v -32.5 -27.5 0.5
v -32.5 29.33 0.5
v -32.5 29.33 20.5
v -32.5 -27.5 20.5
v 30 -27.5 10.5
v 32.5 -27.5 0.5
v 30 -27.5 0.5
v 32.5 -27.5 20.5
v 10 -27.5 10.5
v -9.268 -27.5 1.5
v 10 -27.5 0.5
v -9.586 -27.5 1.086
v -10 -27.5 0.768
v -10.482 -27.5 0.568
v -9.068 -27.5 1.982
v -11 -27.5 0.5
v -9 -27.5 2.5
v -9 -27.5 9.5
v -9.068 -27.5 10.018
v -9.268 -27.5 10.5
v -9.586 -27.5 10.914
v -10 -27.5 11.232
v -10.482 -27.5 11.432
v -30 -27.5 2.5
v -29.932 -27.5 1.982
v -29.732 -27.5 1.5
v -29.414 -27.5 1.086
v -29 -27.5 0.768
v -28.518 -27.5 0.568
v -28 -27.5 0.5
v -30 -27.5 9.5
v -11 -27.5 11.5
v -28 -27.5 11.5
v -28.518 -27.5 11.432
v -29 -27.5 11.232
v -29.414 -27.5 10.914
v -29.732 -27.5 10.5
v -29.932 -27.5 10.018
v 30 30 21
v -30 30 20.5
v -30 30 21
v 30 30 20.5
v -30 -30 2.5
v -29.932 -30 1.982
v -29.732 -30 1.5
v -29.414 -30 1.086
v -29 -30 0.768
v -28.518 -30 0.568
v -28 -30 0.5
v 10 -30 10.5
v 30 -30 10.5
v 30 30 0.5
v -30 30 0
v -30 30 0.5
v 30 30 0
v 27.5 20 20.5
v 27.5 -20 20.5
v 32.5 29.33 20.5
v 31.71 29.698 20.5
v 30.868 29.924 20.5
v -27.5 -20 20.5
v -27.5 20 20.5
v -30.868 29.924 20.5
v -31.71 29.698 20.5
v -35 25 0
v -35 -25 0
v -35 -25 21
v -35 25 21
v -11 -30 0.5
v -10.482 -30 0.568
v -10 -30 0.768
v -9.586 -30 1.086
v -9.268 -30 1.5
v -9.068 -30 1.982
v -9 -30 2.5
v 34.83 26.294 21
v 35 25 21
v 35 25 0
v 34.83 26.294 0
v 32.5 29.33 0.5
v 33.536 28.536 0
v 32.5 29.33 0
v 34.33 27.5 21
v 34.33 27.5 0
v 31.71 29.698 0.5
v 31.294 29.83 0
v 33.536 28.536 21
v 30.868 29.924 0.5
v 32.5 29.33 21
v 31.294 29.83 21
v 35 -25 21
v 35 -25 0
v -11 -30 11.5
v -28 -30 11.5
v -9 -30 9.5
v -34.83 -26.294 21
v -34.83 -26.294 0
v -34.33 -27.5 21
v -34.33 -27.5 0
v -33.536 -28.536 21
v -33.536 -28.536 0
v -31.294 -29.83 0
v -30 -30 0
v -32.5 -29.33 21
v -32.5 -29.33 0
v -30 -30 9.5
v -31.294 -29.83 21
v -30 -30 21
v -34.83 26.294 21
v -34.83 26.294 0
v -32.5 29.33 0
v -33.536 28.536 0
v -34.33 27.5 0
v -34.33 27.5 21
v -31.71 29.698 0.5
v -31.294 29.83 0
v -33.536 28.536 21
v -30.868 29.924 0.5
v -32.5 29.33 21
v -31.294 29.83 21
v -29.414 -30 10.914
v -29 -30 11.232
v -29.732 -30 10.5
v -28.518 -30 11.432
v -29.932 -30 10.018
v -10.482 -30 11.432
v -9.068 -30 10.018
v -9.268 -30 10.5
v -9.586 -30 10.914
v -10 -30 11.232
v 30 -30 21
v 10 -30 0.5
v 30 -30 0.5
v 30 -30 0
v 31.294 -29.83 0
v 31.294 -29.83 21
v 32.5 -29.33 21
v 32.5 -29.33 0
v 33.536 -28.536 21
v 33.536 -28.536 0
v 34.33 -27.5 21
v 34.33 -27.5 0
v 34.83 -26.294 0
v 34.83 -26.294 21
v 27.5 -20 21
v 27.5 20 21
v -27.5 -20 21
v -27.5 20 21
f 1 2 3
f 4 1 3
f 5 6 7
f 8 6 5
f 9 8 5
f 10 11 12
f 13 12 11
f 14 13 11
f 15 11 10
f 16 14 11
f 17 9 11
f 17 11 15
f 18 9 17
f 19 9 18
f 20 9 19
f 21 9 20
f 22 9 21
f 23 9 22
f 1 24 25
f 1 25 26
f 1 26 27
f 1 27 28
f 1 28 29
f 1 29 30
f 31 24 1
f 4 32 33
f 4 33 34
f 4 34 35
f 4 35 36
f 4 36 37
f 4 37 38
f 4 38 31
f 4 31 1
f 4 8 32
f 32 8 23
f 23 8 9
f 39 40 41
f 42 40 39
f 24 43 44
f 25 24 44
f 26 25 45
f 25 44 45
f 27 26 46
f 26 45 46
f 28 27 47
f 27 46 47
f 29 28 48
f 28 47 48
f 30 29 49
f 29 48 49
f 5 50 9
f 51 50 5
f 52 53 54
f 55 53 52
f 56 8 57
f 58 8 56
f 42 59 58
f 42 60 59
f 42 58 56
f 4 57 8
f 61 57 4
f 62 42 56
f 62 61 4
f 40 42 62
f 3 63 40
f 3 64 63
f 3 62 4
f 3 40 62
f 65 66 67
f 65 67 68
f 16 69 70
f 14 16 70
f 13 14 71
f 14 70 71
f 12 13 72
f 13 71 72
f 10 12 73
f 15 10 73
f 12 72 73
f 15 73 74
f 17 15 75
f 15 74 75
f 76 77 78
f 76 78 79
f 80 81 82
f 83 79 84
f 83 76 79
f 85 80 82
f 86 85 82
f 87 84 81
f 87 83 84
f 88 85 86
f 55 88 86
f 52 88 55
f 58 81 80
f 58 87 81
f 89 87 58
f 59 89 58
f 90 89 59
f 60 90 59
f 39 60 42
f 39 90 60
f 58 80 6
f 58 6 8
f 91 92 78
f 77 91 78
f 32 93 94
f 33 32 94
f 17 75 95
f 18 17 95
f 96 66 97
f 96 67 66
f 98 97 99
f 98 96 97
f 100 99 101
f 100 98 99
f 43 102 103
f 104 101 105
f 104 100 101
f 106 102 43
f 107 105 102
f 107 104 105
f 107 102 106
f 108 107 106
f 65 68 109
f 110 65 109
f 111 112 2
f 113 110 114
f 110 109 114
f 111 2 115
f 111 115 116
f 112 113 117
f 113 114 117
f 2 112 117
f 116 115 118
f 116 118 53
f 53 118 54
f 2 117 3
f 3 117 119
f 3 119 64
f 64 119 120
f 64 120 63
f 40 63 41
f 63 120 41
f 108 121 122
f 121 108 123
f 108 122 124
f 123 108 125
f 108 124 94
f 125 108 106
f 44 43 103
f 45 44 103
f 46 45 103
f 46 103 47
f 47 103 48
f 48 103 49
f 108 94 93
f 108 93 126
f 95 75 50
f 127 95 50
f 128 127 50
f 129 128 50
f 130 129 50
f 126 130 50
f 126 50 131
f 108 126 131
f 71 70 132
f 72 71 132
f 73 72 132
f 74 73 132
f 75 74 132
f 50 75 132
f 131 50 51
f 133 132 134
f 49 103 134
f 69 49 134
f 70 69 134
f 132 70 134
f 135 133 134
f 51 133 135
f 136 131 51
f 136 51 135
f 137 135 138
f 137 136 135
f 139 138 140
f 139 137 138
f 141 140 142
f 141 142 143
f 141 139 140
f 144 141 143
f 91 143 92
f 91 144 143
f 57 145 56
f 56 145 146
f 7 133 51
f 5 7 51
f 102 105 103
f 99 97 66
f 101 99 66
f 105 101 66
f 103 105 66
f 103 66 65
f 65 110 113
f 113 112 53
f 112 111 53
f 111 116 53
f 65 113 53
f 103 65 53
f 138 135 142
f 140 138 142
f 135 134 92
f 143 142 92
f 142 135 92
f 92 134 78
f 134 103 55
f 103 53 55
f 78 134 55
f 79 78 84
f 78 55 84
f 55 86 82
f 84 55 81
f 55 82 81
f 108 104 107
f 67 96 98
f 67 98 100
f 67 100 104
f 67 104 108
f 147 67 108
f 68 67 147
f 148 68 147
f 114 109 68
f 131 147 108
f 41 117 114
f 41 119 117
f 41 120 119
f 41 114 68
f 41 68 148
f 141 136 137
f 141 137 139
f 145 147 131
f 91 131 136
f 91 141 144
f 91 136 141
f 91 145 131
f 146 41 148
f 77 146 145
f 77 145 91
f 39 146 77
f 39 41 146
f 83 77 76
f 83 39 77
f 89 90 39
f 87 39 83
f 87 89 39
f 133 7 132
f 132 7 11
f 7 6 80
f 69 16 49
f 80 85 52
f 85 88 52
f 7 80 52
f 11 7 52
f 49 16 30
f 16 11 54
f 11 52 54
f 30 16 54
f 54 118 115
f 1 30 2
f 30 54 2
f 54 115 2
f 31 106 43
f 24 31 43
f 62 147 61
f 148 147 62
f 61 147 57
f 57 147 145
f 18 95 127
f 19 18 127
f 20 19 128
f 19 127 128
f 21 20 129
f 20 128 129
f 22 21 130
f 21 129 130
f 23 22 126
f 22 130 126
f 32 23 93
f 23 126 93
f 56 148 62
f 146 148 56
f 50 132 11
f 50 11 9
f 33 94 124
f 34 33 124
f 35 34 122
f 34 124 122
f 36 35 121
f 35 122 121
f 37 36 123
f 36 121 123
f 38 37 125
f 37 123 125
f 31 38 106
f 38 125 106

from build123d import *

# Parameters (mm, degrees)
F0_W      = 70
F0_H      = 60
F1_DEPTH  = 21
F2_R      = 5
F3_W      = 65
F3_H      = 20
F4_DEPTH  = 57.5
F5_W      = 55
F5_H      = 40
F6_DEPTH  = 1
F8_DEPTH  = 5
F9_W      = 20
F9_H      = 10
F10_DEPTH = 4


with BuildPart() as f1:
    # F0 (on Top) → F1 (new body)
    with BuildSketch(Plane.XY):
        Rectangle(F0_W, F0_H)
    extrude(amount=F1_DEPTH)

    # F2
    f2_edges = [f1.edges().sort_by_distance(p)[0] for p in [
        (-35, -30, 10.5),
        (-35, 30, 10.5),
        (35, 30, 10.5),
        (35, -30, 10.5),
    ]]
    fillet(f2_edges, radius=F2_R)

    # F3 (on face) → F4 (cut)
    with BuildSketch(Plane(origin=(0, 30, 0), x_dir=(-1, 0, 0), z_dir=(0, 1, 0))):
        with Locations((0, 10.5)):
            Rectangle(F3_W, F3_H)
    extrude(amount=-F4_DEPTH, mode=Mode.SUBTRACT)

    # F5 (on face) → F6 (cut)
    with BuildSketch(Plane.XY.offset(21)):
        Rectangle(F5_W, F5_H)
    extrude(amount=-F6_DEPTH, mode=Mode.SUBTRACT)

    # F7 (on face) → F8 (cut)
    with BuildSketch(Plane.XZ.offset(30)):
        with BuildLine():
            ThreePointArc((-9, 9.5), (-9.585786, 10.914214), (-11, 11.5))
            Line((-11, 11.5), (-28, 11.5))
            ThreePointArc((-28, 11.5), (-29.414214, 10.914214), (-30, 9.5))
            Line((-30, 9.5), (-30, 2.5))
            ThreePointArc((-30, 2.5), (-29.414214, 1.085786), (-28, 0.5))
            Line((-28, 0.5), (-11, 0.5))
            ThreePointArc((-11, 0.5), (-9.585786, 1.085786), (-9, 2.5))
            Line((-9, 2.5), (-9, 9.5))
        make_face()
    extrude(amount=-F8_DEPTH, mode=Mode.SUBTRACT)

    # F9 (on face) → F10 (cut)
    with BuildSketch(Plane.XZ.offset(30)):
        with Locations((20, 5.5)):
            Rectangle(F9_W, F9_H)
    extrude(amount=-F10_DEPTH, mode=Mode.SUBTRACT)


solid = f1.part
